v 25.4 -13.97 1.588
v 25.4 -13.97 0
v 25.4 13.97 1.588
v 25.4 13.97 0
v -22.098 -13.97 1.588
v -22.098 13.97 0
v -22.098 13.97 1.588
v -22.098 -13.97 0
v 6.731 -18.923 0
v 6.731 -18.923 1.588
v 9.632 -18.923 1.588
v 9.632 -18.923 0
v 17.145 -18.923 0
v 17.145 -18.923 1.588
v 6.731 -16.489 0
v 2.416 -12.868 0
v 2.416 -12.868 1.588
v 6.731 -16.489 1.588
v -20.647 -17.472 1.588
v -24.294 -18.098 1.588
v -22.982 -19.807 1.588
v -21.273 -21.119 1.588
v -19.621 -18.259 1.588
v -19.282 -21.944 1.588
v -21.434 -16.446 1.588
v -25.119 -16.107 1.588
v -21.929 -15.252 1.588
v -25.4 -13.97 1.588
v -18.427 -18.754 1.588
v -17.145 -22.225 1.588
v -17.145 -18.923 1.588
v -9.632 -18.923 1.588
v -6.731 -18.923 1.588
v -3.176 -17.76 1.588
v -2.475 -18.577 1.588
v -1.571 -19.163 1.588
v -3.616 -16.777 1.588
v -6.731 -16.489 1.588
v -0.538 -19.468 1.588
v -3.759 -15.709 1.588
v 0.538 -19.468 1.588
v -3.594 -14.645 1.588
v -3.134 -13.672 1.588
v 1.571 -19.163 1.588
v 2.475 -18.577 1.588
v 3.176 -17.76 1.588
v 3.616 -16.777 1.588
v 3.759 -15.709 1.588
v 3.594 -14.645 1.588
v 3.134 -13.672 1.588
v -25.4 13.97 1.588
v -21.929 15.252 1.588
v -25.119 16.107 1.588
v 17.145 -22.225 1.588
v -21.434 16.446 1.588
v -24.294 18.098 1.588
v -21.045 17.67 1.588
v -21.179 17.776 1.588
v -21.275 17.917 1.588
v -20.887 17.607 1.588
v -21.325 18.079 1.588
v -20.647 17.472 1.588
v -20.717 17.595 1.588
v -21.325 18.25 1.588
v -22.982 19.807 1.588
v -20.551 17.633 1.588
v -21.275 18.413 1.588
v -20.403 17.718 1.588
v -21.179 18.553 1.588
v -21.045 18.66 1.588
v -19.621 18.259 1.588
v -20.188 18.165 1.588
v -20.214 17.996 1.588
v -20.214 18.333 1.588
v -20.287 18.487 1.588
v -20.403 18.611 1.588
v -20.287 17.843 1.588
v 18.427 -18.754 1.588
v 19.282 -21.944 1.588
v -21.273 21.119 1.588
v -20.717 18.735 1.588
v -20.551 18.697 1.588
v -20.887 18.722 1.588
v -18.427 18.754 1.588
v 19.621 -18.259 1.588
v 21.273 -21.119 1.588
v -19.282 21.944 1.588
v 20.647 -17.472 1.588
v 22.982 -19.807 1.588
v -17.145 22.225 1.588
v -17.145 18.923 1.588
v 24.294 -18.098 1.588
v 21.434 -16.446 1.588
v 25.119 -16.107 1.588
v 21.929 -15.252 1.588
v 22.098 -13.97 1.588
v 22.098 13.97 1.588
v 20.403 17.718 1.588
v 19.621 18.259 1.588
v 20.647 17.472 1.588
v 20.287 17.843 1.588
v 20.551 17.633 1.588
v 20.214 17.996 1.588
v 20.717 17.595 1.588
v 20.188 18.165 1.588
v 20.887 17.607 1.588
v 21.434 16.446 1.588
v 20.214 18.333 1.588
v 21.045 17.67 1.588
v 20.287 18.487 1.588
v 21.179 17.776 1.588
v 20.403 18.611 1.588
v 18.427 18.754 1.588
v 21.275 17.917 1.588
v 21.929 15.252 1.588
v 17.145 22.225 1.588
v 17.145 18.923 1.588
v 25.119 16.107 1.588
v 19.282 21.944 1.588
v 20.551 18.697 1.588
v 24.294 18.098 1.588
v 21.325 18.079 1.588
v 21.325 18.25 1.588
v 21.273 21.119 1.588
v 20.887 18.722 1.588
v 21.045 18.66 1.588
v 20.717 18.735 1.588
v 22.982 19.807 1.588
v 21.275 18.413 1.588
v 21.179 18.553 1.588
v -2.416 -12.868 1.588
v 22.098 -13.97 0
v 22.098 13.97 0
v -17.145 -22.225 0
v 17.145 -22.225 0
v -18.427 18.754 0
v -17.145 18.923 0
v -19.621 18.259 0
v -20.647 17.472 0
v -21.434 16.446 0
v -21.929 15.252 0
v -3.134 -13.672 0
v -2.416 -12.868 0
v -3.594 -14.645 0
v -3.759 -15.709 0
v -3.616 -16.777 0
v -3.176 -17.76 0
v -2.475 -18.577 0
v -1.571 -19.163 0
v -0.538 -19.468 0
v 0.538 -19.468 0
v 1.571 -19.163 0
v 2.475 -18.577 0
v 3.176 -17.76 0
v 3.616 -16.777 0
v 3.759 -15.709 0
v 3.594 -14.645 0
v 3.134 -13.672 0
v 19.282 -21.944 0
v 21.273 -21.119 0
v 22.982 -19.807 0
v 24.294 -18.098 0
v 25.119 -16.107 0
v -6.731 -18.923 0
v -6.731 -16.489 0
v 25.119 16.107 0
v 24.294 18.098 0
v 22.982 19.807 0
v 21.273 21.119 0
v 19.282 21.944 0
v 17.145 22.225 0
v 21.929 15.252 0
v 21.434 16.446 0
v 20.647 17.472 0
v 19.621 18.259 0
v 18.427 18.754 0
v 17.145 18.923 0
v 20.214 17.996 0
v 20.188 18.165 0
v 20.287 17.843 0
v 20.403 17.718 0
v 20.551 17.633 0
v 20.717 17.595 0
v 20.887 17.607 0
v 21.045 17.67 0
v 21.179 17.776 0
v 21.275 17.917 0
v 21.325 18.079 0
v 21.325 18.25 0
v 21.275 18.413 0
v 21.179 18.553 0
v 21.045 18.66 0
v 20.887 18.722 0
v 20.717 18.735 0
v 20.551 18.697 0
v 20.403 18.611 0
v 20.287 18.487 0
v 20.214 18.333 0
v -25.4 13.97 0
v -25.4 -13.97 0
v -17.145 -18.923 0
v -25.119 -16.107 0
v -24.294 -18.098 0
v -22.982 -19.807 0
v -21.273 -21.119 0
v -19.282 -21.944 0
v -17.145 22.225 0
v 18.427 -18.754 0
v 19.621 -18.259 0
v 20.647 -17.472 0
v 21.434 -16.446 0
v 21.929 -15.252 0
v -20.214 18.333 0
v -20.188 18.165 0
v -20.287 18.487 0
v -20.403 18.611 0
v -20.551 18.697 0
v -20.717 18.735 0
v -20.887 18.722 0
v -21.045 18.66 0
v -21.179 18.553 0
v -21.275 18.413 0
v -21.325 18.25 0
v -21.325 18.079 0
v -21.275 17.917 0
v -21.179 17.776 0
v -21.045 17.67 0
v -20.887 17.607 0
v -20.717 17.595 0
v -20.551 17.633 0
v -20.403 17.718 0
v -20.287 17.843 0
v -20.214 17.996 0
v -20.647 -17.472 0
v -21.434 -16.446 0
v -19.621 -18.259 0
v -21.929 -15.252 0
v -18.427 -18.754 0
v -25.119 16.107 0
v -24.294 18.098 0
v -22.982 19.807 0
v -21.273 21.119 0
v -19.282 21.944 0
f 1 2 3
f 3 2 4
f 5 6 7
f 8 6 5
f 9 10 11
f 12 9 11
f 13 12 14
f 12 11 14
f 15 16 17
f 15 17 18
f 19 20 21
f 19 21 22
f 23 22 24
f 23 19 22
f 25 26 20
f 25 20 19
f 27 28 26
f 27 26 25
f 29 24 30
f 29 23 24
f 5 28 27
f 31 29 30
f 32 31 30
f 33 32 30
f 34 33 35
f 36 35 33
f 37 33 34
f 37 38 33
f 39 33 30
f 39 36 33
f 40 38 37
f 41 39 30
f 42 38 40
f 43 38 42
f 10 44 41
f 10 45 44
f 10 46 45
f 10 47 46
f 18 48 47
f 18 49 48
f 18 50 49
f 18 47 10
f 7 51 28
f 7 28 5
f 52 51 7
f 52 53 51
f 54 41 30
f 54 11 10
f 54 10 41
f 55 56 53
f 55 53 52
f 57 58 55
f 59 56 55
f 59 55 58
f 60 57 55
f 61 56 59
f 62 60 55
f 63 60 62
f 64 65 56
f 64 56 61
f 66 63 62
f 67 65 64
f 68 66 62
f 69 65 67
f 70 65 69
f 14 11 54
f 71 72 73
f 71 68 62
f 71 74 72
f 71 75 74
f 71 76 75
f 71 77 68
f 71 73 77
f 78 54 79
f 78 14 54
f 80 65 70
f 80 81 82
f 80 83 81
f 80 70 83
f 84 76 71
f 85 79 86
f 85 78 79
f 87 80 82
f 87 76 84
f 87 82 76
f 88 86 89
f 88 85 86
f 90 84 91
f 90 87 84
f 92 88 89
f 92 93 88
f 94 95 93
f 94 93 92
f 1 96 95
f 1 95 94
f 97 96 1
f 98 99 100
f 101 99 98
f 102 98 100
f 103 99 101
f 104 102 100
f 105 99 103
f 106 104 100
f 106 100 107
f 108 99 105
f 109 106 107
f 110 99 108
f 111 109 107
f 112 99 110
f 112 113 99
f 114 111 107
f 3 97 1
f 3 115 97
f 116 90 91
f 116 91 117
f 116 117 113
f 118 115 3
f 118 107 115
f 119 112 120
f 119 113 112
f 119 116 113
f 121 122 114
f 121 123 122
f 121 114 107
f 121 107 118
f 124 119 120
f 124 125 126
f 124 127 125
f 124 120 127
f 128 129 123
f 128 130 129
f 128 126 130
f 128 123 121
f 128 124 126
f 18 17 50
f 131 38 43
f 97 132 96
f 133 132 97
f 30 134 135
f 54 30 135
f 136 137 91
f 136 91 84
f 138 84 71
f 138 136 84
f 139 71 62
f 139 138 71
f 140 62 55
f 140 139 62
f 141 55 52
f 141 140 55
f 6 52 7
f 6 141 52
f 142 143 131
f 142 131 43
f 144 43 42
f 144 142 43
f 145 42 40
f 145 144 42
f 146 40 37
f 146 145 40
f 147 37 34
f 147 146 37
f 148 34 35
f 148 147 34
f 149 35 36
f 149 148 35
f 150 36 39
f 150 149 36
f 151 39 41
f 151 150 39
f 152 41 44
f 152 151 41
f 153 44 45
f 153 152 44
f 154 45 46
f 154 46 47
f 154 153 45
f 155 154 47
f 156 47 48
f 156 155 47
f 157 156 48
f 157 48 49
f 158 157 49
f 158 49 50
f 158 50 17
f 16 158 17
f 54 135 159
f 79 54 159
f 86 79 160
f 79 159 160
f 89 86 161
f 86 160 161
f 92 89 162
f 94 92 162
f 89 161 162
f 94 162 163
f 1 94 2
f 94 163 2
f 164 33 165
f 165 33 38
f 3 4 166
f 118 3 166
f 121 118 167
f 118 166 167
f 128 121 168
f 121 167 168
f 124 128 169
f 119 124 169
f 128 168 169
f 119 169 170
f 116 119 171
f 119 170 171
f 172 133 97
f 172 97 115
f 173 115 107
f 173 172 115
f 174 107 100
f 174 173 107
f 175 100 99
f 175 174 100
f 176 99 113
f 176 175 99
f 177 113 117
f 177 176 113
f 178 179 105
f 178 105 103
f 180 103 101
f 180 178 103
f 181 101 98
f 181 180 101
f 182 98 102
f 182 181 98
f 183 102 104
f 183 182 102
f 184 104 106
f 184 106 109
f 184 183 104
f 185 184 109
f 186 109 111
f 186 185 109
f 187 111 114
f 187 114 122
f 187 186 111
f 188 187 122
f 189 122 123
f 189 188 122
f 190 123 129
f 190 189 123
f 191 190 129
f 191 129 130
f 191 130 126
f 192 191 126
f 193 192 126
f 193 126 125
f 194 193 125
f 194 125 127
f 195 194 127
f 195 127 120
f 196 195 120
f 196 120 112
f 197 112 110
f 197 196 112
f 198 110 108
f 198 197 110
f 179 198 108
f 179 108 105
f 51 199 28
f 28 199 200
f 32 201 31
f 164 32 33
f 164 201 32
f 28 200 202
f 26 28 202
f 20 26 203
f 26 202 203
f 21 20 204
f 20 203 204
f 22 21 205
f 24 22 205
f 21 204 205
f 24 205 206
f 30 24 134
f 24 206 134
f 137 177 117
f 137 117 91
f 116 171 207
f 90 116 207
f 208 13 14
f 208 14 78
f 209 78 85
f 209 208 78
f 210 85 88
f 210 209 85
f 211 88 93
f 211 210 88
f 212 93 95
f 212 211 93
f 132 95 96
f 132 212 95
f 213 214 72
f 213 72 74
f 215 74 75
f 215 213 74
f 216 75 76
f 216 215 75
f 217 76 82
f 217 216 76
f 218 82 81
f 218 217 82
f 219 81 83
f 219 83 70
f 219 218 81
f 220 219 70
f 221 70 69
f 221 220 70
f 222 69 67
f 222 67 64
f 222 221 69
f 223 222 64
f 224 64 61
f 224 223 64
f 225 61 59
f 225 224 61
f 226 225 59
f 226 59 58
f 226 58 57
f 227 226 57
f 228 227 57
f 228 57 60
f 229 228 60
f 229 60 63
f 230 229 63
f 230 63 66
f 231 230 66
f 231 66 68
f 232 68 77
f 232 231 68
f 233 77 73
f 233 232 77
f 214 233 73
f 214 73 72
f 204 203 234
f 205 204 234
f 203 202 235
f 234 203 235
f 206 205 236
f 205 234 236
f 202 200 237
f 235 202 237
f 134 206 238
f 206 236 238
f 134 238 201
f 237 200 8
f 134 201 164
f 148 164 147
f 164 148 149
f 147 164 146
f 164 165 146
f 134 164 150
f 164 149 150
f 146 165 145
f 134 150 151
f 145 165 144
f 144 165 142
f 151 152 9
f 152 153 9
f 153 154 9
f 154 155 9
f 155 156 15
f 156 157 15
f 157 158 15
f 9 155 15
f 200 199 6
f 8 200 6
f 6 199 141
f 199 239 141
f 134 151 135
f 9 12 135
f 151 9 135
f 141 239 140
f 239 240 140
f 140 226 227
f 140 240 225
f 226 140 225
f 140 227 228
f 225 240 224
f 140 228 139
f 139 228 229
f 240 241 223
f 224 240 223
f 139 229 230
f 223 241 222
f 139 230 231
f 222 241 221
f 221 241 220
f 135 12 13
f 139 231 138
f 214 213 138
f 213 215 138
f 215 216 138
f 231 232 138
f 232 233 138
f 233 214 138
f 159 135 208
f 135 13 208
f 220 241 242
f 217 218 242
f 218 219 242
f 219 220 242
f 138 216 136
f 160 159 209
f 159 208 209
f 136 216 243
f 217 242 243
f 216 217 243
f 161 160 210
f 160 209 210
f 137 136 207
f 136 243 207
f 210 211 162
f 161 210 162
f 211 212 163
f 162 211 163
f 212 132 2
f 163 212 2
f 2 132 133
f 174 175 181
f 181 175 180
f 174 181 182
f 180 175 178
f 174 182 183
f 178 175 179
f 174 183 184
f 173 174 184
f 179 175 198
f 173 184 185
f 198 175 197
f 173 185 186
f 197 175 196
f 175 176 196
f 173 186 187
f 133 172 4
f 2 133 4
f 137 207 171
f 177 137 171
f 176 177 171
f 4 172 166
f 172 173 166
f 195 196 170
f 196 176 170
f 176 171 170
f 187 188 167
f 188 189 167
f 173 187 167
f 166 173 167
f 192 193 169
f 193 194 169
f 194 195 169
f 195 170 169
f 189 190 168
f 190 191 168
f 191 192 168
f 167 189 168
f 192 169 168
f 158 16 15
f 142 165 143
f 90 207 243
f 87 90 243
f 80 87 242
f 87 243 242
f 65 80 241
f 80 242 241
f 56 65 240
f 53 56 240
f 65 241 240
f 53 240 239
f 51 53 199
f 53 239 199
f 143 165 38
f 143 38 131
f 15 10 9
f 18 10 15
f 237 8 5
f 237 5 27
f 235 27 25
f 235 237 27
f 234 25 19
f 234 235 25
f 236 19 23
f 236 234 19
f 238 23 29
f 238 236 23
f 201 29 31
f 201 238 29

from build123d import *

# Parameters (mm, degrees)
SKETCH1_R           = 0.5715
BOSS_EXTRUDE1_DEPTH = 1.5875
CUT_EXTRUDE1_REACH  = 35.788
SKETCH2_W           = 2.901094666
SKETCH2_H           = 2.434307465


with BuildPart() as part:
    # Sketch1 → Boss-Extrude1 (new body)
    with BuildSketch(Plane.XY):
        with BuildLine():
            Line((17.145, 22.225), (-17.145, 22.225))
            ThreePointArc((-17.145, 22.225), (-22.982166479, 19.807166479), (-25.4, 13.97))
            Line((-25.4, 13.97), (-25.4, -13.97))
            ThreePointArc((-25.4, -13.97), (-22.982166479, -19.807166479), (-17.145, -22.225))
            Line((-17.145, -22.225), (17.145, -22.225))
            ThreePointArc((17.145, -22.225), (22.982166479, -19.807166479), (25.4, -13.97))
            Line((25.4, -13.97), (25.4, 13.97))
            ThreePointArc((25.4, 13.97), (22.982166479, 19.807166479), (17.145, 22.225))
        make_face()
        with Locations((-20.759611123, 18.164659732)):
            Circle(SKETCH1_R, mode=Mode.SUBTRACT)
        with Locations(Location((20.759611123, 18.164659732, 0), (0, 0, 180))):
            Circle(SKETCH1_R, mode=Mode.SUBTRACT)
        with BuildLine():
            Line((-17.145, -18.923), (-9.632094666, -18.923))
            Line((-9.632094666, -18.923), (-2.416367182, -12.868285729))
            ThreePointArc((-2.416367182, -12.868285729), (0, -19.5072), (2.416367182, -12.868285729))
            Line((2.416367182, -12.868285729), (9.632094666, -18.923))
            Line((9.632094666, -18.923), (17.145, -18.923))
            ThreePointArc((17.145, -18.923), (20.647299887, -17.472299887), (22.098, -13.97))
            Line((22.098, -13.97), (22.098, 13.97))
            ThreePointArc((22.098, 13.97), (20.647299887, 17.472299887), (17.145, 18.923))
            Line((17.145, 18.923), (-17.145, 18.923))
            ThreePointArc((-17.145, 18.923), (-20.647299887, 17.472299887), (-22.098, 13.97))
            Line((-22.098, 13.97), (-22.098, -13.97))
            ThreePointArc((-22.098, -13.97), (-20.647299887, -17.472299887), (-17.145, -18.923))
        make_face(mode=Mode.SUBTRACT)
    extrude(amount=BOSS_EXTRUDE1_DEPTH)

    # Sketch2 → Cut-Extrude1 (cut, up to next)
    with BuildSketch(Plane.XY.offset(1.5875), mode=Mode.PRIVATE) as cut_extrude1_sk1:
        with Locations((-8.181547333, -17.705846268)):
            Rectangle(SKETCH2_W, SKETCH2_H)
    cut_extrude1_tool1 = extrude(cut_extrude1_sk1.sketch, amount=-CUT_EXTRUDE1_REACH, mode=Mode.PRIVATE) & part.part
    # Sketch2 → Cut-Extrude1 (cut, up to next)
    with BuildSketch(Plane.XY.offset(1.5875), mode=Mode.PRIVATE) as cut_extrude1_sk2:
        with Locations((8.181547333, -17.705846268)):
            Rectangle(SKETCH2_W, SKETCH2_H)
    cut_extrude1_tool2 = extrude(cut_extrude1_sk2.sketch, amount=-CUT_EXTRUDE1_REACH, mode=Mode.PRIVATE) & part.part
    add(cut_extrude1_tool1.solids().sort_by_distance((-8.181547, -17.705846, 1.5875))[0], mode=Mode.SUBTRACT)
    add(cut_extrude1_tool2.solids().sort_by_distance((8.181547, -17.705846, 1.5875))[0], mode=Mode.SUBTRACT)


solid = part.part
